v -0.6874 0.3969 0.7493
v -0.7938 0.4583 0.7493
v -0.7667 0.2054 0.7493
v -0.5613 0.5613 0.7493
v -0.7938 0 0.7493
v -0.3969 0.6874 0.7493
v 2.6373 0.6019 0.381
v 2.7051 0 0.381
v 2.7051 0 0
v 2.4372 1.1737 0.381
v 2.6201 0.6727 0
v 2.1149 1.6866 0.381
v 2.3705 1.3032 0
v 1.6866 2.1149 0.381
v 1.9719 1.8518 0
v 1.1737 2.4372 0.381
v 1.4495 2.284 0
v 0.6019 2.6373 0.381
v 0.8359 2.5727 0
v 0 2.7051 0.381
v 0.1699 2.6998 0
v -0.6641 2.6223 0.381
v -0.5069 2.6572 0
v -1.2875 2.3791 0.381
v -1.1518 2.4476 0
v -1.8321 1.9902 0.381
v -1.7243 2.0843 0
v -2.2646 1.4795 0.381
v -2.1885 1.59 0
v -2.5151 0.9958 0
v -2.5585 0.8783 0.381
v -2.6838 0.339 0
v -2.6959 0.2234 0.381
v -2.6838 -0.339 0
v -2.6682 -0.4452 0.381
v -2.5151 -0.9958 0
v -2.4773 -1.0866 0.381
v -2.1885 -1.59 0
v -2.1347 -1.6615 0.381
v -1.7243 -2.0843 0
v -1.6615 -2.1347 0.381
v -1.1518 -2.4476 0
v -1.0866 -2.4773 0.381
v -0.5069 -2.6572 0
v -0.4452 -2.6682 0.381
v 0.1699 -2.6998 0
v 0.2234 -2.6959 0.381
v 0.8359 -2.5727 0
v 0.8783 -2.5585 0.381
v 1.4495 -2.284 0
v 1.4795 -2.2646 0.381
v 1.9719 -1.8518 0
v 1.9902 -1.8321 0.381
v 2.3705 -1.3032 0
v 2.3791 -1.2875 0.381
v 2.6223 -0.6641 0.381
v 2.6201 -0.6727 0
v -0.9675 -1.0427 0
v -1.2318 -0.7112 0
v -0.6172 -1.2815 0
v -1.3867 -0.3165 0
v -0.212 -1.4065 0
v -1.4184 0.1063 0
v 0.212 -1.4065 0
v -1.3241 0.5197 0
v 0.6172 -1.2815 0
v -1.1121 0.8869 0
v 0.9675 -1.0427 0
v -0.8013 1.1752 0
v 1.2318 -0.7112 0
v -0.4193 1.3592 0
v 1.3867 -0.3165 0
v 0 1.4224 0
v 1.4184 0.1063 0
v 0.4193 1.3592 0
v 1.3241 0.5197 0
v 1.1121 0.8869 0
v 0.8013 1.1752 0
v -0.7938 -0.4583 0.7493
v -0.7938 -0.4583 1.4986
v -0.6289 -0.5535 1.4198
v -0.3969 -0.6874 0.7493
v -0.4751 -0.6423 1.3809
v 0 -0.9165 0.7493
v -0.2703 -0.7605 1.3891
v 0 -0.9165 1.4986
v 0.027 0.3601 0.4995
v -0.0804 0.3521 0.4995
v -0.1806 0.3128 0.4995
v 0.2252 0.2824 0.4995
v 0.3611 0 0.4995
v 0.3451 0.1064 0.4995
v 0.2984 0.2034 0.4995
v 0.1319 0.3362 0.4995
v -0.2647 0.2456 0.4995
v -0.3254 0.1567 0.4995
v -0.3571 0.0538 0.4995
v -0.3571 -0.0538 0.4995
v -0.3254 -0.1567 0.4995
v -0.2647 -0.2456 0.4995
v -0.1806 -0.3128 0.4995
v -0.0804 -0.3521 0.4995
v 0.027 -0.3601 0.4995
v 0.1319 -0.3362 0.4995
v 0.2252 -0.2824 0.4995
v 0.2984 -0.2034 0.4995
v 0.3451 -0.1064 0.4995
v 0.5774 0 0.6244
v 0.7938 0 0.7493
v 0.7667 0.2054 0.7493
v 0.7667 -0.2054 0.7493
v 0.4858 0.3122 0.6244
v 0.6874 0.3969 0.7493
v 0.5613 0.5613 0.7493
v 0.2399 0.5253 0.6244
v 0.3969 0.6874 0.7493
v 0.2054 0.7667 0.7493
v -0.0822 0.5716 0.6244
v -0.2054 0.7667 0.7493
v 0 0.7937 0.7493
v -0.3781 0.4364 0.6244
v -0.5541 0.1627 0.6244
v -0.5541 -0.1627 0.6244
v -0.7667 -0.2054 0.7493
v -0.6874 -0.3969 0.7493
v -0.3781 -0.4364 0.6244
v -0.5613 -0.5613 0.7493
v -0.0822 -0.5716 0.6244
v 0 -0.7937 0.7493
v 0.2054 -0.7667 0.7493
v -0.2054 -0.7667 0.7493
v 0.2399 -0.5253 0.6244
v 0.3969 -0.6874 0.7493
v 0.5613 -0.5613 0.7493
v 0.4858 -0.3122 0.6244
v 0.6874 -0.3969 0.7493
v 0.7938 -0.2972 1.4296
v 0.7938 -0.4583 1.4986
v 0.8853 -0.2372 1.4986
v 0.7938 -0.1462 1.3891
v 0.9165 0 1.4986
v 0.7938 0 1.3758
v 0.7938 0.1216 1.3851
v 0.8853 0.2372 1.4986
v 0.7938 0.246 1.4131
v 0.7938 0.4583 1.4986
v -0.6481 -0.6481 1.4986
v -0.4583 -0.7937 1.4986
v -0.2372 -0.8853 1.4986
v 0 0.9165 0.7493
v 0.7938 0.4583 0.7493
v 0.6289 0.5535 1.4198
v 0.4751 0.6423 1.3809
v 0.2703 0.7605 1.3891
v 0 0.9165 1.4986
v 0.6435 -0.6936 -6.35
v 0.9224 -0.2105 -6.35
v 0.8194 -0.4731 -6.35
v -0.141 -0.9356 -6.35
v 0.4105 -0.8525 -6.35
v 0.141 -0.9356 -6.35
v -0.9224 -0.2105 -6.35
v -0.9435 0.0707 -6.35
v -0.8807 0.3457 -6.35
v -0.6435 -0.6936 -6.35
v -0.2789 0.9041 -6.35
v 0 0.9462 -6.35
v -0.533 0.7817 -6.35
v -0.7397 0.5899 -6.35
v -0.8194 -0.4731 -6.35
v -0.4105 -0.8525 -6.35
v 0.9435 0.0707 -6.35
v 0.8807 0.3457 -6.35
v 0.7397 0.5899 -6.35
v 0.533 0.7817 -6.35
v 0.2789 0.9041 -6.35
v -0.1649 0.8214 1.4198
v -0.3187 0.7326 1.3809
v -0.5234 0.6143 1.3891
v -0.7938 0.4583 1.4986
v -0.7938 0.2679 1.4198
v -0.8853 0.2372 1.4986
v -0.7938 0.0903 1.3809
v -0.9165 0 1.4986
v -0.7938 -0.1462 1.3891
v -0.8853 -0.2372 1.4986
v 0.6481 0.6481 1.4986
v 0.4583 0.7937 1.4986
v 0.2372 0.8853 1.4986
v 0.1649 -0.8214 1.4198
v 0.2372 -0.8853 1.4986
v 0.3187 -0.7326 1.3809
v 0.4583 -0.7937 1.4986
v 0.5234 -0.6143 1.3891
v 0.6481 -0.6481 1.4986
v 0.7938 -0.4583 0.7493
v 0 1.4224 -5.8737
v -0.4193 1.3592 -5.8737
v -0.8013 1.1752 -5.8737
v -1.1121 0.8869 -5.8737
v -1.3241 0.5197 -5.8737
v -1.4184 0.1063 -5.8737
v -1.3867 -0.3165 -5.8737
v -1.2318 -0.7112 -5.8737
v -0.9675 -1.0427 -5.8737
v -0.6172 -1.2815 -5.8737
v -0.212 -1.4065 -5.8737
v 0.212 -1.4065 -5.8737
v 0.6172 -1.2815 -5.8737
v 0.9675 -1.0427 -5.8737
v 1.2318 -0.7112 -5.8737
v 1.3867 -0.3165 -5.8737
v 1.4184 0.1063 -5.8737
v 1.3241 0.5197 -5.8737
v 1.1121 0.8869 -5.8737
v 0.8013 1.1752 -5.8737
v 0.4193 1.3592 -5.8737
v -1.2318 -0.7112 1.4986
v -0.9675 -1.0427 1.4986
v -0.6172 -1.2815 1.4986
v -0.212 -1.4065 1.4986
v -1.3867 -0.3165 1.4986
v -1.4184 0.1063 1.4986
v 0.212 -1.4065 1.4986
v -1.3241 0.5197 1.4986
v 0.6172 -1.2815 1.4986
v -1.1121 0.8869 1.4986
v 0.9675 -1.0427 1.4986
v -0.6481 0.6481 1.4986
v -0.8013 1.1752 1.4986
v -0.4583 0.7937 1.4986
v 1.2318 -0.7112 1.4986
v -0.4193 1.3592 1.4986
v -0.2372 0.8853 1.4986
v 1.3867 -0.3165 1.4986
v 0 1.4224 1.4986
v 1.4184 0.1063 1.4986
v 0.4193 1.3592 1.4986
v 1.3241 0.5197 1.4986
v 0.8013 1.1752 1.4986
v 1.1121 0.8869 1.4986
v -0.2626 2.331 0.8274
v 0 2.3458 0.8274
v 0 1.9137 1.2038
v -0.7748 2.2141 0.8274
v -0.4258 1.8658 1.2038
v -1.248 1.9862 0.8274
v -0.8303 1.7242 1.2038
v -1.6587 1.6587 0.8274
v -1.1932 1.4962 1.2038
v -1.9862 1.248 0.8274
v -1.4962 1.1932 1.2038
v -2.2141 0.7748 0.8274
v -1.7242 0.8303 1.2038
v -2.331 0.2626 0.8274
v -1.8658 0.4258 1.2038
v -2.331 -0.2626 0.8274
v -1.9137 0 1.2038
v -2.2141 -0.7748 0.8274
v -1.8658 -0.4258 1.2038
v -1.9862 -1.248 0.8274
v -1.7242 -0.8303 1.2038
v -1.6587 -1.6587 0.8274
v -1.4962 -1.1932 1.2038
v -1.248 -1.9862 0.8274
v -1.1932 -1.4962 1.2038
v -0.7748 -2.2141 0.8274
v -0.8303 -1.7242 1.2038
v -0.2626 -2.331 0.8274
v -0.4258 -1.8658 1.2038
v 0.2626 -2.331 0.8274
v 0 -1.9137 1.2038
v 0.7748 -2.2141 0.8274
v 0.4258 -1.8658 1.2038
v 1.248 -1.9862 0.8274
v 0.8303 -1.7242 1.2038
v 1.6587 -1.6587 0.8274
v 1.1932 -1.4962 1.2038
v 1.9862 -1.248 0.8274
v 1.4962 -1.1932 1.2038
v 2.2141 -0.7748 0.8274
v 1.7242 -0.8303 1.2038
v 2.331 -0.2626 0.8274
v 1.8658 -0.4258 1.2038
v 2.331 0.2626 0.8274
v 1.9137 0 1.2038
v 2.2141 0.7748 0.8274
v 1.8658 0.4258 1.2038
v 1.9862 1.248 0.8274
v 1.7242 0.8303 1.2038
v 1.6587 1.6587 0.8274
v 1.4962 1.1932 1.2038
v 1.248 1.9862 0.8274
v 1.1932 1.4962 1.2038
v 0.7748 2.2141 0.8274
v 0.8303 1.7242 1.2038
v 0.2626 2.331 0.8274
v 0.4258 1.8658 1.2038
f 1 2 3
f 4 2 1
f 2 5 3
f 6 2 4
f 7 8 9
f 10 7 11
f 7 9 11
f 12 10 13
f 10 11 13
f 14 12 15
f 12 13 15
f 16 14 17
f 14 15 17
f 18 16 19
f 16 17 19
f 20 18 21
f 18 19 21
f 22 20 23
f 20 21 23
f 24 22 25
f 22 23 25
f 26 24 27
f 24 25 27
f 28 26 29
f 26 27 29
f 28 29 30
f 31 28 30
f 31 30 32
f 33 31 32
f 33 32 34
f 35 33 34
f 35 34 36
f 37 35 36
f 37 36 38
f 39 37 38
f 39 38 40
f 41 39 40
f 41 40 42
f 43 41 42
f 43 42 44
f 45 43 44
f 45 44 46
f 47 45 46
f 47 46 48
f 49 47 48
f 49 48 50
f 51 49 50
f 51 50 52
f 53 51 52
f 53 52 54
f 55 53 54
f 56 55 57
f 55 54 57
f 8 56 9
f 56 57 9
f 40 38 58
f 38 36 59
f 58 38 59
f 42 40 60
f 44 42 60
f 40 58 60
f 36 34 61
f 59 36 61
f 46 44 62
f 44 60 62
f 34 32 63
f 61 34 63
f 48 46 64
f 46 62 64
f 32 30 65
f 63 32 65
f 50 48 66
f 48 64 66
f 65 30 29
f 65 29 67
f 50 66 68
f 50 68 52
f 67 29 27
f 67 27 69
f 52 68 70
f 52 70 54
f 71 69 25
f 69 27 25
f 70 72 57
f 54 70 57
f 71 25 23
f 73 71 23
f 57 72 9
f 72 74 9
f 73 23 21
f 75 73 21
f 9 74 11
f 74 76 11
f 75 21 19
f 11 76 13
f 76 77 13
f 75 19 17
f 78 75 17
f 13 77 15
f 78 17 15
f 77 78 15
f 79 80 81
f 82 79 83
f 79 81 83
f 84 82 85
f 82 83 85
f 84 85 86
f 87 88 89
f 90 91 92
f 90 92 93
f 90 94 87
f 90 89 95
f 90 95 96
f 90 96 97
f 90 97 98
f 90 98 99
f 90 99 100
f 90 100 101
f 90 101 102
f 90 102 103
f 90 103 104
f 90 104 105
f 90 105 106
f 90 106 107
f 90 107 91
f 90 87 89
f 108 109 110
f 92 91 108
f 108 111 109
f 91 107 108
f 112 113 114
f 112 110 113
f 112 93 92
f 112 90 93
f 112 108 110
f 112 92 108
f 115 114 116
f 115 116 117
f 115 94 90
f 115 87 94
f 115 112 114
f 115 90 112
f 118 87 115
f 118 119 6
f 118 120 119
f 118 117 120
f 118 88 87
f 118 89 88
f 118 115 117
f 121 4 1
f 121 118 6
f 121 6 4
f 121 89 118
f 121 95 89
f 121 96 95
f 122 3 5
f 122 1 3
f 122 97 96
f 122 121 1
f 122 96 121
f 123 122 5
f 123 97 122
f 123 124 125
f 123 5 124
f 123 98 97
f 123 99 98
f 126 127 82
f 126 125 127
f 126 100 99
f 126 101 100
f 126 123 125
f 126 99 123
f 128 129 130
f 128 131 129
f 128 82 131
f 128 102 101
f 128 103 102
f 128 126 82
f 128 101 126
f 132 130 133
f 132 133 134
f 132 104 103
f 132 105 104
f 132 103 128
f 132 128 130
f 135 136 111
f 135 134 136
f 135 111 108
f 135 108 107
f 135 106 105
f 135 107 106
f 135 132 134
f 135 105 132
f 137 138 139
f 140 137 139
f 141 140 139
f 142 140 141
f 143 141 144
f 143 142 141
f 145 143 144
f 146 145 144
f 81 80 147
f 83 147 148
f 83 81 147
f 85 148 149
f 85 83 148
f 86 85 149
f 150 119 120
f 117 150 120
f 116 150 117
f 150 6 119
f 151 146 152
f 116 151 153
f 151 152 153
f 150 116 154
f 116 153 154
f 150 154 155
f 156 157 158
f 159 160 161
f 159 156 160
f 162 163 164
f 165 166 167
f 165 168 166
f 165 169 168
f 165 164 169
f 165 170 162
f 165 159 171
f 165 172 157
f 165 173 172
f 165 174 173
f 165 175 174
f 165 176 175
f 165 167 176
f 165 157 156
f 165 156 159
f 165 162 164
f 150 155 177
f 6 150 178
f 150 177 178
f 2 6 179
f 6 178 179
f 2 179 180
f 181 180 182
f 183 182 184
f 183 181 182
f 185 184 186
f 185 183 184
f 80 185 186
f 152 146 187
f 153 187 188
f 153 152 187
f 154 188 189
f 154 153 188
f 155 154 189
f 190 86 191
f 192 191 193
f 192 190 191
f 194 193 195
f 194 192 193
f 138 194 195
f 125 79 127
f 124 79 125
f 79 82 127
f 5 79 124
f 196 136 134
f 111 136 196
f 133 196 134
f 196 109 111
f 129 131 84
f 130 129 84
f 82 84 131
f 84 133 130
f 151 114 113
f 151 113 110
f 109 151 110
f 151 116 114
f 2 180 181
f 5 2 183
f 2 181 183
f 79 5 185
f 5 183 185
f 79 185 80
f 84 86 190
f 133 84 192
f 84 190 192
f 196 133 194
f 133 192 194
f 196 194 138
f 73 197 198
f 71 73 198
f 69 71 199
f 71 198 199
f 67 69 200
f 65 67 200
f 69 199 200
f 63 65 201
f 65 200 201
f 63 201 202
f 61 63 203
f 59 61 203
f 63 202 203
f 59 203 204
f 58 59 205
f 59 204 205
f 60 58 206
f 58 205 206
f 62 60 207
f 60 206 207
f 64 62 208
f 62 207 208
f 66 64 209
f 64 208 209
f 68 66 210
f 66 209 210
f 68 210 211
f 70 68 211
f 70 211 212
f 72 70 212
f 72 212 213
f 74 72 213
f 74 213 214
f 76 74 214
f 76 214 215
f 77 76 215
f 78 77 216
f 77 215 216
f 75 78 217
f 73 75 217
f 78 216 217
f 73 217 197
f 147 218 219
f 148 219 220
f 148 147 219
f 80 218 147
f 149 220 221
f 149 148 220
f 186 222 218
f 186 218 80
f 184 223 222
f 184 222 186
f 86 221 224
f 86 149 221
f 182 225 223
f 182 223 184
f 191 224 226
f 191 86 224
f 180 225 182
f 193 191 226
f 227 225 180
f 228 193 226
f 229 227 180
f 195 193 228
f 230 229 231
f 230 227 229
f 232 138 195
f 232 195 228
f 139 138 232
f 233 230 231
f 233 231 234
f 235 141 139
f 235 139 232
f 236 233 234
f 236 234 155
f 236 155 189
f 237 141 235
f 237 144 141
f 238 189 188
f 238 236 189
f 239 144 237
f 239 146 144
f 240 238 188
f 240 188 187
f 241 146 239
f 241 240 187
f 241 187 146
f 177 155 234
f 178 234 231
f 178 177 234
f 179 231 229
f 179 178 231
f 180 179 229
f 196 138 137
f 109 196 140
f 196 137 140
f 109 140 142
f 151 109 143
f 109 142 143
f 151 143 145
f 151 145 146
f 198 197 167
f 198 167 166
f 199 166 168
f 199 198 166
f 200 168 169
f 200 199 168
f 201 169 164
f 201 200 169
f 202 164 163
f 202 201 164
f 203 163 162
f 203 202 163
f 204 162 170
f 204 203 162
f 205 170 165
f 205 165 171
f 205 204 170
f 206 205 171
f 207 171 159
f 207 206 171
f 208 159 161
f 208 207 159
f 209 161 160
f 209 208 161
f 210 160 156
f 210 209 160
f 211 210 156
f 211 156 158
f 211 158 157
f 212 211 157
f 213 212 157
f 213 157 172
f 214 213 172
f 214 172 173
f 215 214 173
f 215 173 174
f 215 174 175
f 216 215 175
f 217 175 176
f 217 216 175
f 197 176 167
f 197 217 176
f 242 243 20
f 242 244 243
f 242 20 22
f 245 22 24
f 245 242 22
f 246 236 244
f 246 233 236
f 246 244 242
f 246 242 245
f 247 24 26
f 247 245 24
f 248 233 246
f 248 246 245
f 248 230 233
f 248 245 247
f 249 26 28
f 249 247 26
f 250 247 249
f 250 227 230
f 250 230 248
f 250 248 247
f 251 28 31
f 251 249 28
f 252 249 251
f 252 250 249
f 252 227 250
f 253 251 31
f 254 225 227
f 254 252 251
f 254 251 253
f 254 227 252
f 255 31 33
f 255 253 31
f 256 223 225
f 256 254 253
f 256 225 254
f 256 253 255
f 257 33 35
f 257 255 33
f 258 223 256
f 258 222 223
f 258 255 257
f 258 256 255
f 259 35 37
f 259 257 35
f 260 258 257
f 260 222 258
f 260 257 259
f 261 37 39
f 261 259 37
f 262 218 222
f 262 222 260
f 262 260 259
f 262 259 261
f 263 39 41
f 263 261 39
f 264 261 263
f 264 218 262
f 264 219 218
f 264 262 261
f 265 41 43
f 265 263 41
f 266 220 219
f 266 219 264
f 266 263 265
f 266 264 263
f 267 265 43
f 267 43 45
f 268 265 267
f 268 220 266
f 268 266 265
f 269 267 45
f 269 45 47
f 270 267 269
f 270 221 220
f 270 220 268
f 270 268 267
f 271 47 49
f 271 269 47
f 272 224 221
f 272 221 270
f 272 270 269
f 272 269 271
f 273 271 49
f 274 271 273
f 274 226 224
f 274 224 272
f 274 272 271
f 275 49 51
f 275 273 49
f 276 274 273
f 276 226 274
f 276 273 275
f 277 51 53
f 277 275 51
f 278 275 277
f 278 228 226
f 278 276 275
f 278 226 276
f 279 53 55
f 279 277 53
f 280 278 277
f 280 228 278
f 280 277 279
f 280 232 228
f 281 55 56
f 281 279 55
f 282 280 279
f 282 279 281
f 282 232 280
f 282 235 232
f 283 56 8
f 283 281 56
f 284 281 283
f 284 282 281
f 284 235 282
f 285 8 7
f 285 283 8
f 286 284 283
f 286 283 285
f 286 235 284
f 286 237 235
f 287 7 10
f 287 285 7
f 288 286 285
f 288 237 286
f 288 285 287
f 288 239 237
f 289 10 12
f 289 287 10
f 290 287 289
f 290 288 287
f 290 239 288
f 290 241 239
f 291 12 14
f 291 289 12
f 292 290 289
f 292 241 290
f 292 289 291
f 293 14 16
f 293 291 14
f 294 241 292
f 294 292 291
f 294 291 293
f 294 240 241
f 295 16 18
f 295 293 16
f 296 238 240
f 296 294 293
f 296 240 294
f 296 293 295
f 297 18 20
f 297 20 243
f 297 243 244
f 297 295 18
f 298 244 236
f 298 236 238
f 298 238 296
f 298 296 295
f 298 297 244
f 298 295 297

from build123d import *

# Parameters (mm, degrees)
SKETCH1_W          = 6.35
SKETCH1_H          = 1.4224
CHAMFER1_SIZE      = 0.47625
SKETCH4_R          = 2.7051
EXTRUDE1_DEPTH     = 1.4986
CUT_EXTRUDE1_DEPTH = 0.7493
SKETCH7_R          = 0.916543552
CUT_EXTRUDE4_DEPTH = 0.7493
CUT_EXTRUDE4_TAPER = 45
SKETCH8_R          = 0.79375
CUT_EXTRUDE5_DEPTH = 0.249766667
CUT_EXTRUDE5_TAPER = 60


with BuildPart() as part:
    # Sketch1 → Revolve1 (revolve)
    with BuildSketch(Plane(origin=(0, 0, 0), x_dir=(0, 0, -1), z_dir=(1, 0, 0))):
        with Locations((3.175, 0.7112)):
            Rectangle(SKETCH1_W, SKETCH1_H)
    revolve(axis=Axis((0, 0, 0), (0, 0, 1)))

    # Chamfer1
    chamfer1_edges = [part.edges().sort_by_distance(p)[0] for p in [
        (0, -1.4224, -6.35),
    ]]
    chamfer(chamfer1_edges, length=CHAMFER1_SIZE)

    # Sketch4 → Extrude1 (add)
    with BuildSketch(Plane.XY):
        Circle(SKETCH4_R)
    extrude(amount=EXTRUDE1_DEPTH)

    # Sketch9 → Cut-Revolve3 (revolve, cut)
    with BuildSketch(Plane(origin=(0, 0, 0), x_dir=(0, 0, -1), z_dir=(1, 0, 0))):
        with BuildLine():
            Line((0, 2.7051), (-0.381, 2.7051))
            ThreePointArc((-0.381, 2.7051), (-1.025093234, 2.138064897), (-1.4986, 1.4224))
            Line((-1.4986, 1.4224), (-1.8796, 1.4224))
            Line((-1.8796, 1.4224), (-1.8796, 3.0861))
            Line((-1.8796, 3.0861), (0, 3.0861))
            Line((0, 3.0861), (0, 2.7051))
        make_face()
    revolve(axis=Axis((0, 0, 0), (0, 0, 1)), mode=Mode.SUBTRACT)

    # Sketch6 → Cut-Extrude1 (cut)
    with BuildSketch(Plane.XY.offset(1.4986)):
        Polygon((0, -0.916543552), (0.79375, -0.458271776), (0.79375, 0.458271776), (0, 0.916543552), (-0.79375, 0.458271776), (-0.79375, -0.458271776), align=None)
    extrude(amount=-CUT_EXTRUDE1_DEPTH, mode=Mode.SUBTRACT)

    # Sketch7 → Cut-Extrude4 (cut)
    with BuildSketch(Plane.XY.offset(1.4986)):
        Circle(SKETCH7_R)
    extrude(amount=-CUT_EXTRUDE4_DEPTH, taper=CUT_EXTRUDE4_TAPER, mode=Mode.SUBTRACT)

    # Sketch8 → Cut-Extrude5 (cut)
    with BuildSketch(Plane.XY.offset(0.7493)):
        Circle(SKETCH8_R)
    extrude(amount=-CUT_EXTRUDE5_DEPTH, taper=CUT_EXTRUDE5_TAPER, mode=Mode.SUBTRACT)


solid = part.part
